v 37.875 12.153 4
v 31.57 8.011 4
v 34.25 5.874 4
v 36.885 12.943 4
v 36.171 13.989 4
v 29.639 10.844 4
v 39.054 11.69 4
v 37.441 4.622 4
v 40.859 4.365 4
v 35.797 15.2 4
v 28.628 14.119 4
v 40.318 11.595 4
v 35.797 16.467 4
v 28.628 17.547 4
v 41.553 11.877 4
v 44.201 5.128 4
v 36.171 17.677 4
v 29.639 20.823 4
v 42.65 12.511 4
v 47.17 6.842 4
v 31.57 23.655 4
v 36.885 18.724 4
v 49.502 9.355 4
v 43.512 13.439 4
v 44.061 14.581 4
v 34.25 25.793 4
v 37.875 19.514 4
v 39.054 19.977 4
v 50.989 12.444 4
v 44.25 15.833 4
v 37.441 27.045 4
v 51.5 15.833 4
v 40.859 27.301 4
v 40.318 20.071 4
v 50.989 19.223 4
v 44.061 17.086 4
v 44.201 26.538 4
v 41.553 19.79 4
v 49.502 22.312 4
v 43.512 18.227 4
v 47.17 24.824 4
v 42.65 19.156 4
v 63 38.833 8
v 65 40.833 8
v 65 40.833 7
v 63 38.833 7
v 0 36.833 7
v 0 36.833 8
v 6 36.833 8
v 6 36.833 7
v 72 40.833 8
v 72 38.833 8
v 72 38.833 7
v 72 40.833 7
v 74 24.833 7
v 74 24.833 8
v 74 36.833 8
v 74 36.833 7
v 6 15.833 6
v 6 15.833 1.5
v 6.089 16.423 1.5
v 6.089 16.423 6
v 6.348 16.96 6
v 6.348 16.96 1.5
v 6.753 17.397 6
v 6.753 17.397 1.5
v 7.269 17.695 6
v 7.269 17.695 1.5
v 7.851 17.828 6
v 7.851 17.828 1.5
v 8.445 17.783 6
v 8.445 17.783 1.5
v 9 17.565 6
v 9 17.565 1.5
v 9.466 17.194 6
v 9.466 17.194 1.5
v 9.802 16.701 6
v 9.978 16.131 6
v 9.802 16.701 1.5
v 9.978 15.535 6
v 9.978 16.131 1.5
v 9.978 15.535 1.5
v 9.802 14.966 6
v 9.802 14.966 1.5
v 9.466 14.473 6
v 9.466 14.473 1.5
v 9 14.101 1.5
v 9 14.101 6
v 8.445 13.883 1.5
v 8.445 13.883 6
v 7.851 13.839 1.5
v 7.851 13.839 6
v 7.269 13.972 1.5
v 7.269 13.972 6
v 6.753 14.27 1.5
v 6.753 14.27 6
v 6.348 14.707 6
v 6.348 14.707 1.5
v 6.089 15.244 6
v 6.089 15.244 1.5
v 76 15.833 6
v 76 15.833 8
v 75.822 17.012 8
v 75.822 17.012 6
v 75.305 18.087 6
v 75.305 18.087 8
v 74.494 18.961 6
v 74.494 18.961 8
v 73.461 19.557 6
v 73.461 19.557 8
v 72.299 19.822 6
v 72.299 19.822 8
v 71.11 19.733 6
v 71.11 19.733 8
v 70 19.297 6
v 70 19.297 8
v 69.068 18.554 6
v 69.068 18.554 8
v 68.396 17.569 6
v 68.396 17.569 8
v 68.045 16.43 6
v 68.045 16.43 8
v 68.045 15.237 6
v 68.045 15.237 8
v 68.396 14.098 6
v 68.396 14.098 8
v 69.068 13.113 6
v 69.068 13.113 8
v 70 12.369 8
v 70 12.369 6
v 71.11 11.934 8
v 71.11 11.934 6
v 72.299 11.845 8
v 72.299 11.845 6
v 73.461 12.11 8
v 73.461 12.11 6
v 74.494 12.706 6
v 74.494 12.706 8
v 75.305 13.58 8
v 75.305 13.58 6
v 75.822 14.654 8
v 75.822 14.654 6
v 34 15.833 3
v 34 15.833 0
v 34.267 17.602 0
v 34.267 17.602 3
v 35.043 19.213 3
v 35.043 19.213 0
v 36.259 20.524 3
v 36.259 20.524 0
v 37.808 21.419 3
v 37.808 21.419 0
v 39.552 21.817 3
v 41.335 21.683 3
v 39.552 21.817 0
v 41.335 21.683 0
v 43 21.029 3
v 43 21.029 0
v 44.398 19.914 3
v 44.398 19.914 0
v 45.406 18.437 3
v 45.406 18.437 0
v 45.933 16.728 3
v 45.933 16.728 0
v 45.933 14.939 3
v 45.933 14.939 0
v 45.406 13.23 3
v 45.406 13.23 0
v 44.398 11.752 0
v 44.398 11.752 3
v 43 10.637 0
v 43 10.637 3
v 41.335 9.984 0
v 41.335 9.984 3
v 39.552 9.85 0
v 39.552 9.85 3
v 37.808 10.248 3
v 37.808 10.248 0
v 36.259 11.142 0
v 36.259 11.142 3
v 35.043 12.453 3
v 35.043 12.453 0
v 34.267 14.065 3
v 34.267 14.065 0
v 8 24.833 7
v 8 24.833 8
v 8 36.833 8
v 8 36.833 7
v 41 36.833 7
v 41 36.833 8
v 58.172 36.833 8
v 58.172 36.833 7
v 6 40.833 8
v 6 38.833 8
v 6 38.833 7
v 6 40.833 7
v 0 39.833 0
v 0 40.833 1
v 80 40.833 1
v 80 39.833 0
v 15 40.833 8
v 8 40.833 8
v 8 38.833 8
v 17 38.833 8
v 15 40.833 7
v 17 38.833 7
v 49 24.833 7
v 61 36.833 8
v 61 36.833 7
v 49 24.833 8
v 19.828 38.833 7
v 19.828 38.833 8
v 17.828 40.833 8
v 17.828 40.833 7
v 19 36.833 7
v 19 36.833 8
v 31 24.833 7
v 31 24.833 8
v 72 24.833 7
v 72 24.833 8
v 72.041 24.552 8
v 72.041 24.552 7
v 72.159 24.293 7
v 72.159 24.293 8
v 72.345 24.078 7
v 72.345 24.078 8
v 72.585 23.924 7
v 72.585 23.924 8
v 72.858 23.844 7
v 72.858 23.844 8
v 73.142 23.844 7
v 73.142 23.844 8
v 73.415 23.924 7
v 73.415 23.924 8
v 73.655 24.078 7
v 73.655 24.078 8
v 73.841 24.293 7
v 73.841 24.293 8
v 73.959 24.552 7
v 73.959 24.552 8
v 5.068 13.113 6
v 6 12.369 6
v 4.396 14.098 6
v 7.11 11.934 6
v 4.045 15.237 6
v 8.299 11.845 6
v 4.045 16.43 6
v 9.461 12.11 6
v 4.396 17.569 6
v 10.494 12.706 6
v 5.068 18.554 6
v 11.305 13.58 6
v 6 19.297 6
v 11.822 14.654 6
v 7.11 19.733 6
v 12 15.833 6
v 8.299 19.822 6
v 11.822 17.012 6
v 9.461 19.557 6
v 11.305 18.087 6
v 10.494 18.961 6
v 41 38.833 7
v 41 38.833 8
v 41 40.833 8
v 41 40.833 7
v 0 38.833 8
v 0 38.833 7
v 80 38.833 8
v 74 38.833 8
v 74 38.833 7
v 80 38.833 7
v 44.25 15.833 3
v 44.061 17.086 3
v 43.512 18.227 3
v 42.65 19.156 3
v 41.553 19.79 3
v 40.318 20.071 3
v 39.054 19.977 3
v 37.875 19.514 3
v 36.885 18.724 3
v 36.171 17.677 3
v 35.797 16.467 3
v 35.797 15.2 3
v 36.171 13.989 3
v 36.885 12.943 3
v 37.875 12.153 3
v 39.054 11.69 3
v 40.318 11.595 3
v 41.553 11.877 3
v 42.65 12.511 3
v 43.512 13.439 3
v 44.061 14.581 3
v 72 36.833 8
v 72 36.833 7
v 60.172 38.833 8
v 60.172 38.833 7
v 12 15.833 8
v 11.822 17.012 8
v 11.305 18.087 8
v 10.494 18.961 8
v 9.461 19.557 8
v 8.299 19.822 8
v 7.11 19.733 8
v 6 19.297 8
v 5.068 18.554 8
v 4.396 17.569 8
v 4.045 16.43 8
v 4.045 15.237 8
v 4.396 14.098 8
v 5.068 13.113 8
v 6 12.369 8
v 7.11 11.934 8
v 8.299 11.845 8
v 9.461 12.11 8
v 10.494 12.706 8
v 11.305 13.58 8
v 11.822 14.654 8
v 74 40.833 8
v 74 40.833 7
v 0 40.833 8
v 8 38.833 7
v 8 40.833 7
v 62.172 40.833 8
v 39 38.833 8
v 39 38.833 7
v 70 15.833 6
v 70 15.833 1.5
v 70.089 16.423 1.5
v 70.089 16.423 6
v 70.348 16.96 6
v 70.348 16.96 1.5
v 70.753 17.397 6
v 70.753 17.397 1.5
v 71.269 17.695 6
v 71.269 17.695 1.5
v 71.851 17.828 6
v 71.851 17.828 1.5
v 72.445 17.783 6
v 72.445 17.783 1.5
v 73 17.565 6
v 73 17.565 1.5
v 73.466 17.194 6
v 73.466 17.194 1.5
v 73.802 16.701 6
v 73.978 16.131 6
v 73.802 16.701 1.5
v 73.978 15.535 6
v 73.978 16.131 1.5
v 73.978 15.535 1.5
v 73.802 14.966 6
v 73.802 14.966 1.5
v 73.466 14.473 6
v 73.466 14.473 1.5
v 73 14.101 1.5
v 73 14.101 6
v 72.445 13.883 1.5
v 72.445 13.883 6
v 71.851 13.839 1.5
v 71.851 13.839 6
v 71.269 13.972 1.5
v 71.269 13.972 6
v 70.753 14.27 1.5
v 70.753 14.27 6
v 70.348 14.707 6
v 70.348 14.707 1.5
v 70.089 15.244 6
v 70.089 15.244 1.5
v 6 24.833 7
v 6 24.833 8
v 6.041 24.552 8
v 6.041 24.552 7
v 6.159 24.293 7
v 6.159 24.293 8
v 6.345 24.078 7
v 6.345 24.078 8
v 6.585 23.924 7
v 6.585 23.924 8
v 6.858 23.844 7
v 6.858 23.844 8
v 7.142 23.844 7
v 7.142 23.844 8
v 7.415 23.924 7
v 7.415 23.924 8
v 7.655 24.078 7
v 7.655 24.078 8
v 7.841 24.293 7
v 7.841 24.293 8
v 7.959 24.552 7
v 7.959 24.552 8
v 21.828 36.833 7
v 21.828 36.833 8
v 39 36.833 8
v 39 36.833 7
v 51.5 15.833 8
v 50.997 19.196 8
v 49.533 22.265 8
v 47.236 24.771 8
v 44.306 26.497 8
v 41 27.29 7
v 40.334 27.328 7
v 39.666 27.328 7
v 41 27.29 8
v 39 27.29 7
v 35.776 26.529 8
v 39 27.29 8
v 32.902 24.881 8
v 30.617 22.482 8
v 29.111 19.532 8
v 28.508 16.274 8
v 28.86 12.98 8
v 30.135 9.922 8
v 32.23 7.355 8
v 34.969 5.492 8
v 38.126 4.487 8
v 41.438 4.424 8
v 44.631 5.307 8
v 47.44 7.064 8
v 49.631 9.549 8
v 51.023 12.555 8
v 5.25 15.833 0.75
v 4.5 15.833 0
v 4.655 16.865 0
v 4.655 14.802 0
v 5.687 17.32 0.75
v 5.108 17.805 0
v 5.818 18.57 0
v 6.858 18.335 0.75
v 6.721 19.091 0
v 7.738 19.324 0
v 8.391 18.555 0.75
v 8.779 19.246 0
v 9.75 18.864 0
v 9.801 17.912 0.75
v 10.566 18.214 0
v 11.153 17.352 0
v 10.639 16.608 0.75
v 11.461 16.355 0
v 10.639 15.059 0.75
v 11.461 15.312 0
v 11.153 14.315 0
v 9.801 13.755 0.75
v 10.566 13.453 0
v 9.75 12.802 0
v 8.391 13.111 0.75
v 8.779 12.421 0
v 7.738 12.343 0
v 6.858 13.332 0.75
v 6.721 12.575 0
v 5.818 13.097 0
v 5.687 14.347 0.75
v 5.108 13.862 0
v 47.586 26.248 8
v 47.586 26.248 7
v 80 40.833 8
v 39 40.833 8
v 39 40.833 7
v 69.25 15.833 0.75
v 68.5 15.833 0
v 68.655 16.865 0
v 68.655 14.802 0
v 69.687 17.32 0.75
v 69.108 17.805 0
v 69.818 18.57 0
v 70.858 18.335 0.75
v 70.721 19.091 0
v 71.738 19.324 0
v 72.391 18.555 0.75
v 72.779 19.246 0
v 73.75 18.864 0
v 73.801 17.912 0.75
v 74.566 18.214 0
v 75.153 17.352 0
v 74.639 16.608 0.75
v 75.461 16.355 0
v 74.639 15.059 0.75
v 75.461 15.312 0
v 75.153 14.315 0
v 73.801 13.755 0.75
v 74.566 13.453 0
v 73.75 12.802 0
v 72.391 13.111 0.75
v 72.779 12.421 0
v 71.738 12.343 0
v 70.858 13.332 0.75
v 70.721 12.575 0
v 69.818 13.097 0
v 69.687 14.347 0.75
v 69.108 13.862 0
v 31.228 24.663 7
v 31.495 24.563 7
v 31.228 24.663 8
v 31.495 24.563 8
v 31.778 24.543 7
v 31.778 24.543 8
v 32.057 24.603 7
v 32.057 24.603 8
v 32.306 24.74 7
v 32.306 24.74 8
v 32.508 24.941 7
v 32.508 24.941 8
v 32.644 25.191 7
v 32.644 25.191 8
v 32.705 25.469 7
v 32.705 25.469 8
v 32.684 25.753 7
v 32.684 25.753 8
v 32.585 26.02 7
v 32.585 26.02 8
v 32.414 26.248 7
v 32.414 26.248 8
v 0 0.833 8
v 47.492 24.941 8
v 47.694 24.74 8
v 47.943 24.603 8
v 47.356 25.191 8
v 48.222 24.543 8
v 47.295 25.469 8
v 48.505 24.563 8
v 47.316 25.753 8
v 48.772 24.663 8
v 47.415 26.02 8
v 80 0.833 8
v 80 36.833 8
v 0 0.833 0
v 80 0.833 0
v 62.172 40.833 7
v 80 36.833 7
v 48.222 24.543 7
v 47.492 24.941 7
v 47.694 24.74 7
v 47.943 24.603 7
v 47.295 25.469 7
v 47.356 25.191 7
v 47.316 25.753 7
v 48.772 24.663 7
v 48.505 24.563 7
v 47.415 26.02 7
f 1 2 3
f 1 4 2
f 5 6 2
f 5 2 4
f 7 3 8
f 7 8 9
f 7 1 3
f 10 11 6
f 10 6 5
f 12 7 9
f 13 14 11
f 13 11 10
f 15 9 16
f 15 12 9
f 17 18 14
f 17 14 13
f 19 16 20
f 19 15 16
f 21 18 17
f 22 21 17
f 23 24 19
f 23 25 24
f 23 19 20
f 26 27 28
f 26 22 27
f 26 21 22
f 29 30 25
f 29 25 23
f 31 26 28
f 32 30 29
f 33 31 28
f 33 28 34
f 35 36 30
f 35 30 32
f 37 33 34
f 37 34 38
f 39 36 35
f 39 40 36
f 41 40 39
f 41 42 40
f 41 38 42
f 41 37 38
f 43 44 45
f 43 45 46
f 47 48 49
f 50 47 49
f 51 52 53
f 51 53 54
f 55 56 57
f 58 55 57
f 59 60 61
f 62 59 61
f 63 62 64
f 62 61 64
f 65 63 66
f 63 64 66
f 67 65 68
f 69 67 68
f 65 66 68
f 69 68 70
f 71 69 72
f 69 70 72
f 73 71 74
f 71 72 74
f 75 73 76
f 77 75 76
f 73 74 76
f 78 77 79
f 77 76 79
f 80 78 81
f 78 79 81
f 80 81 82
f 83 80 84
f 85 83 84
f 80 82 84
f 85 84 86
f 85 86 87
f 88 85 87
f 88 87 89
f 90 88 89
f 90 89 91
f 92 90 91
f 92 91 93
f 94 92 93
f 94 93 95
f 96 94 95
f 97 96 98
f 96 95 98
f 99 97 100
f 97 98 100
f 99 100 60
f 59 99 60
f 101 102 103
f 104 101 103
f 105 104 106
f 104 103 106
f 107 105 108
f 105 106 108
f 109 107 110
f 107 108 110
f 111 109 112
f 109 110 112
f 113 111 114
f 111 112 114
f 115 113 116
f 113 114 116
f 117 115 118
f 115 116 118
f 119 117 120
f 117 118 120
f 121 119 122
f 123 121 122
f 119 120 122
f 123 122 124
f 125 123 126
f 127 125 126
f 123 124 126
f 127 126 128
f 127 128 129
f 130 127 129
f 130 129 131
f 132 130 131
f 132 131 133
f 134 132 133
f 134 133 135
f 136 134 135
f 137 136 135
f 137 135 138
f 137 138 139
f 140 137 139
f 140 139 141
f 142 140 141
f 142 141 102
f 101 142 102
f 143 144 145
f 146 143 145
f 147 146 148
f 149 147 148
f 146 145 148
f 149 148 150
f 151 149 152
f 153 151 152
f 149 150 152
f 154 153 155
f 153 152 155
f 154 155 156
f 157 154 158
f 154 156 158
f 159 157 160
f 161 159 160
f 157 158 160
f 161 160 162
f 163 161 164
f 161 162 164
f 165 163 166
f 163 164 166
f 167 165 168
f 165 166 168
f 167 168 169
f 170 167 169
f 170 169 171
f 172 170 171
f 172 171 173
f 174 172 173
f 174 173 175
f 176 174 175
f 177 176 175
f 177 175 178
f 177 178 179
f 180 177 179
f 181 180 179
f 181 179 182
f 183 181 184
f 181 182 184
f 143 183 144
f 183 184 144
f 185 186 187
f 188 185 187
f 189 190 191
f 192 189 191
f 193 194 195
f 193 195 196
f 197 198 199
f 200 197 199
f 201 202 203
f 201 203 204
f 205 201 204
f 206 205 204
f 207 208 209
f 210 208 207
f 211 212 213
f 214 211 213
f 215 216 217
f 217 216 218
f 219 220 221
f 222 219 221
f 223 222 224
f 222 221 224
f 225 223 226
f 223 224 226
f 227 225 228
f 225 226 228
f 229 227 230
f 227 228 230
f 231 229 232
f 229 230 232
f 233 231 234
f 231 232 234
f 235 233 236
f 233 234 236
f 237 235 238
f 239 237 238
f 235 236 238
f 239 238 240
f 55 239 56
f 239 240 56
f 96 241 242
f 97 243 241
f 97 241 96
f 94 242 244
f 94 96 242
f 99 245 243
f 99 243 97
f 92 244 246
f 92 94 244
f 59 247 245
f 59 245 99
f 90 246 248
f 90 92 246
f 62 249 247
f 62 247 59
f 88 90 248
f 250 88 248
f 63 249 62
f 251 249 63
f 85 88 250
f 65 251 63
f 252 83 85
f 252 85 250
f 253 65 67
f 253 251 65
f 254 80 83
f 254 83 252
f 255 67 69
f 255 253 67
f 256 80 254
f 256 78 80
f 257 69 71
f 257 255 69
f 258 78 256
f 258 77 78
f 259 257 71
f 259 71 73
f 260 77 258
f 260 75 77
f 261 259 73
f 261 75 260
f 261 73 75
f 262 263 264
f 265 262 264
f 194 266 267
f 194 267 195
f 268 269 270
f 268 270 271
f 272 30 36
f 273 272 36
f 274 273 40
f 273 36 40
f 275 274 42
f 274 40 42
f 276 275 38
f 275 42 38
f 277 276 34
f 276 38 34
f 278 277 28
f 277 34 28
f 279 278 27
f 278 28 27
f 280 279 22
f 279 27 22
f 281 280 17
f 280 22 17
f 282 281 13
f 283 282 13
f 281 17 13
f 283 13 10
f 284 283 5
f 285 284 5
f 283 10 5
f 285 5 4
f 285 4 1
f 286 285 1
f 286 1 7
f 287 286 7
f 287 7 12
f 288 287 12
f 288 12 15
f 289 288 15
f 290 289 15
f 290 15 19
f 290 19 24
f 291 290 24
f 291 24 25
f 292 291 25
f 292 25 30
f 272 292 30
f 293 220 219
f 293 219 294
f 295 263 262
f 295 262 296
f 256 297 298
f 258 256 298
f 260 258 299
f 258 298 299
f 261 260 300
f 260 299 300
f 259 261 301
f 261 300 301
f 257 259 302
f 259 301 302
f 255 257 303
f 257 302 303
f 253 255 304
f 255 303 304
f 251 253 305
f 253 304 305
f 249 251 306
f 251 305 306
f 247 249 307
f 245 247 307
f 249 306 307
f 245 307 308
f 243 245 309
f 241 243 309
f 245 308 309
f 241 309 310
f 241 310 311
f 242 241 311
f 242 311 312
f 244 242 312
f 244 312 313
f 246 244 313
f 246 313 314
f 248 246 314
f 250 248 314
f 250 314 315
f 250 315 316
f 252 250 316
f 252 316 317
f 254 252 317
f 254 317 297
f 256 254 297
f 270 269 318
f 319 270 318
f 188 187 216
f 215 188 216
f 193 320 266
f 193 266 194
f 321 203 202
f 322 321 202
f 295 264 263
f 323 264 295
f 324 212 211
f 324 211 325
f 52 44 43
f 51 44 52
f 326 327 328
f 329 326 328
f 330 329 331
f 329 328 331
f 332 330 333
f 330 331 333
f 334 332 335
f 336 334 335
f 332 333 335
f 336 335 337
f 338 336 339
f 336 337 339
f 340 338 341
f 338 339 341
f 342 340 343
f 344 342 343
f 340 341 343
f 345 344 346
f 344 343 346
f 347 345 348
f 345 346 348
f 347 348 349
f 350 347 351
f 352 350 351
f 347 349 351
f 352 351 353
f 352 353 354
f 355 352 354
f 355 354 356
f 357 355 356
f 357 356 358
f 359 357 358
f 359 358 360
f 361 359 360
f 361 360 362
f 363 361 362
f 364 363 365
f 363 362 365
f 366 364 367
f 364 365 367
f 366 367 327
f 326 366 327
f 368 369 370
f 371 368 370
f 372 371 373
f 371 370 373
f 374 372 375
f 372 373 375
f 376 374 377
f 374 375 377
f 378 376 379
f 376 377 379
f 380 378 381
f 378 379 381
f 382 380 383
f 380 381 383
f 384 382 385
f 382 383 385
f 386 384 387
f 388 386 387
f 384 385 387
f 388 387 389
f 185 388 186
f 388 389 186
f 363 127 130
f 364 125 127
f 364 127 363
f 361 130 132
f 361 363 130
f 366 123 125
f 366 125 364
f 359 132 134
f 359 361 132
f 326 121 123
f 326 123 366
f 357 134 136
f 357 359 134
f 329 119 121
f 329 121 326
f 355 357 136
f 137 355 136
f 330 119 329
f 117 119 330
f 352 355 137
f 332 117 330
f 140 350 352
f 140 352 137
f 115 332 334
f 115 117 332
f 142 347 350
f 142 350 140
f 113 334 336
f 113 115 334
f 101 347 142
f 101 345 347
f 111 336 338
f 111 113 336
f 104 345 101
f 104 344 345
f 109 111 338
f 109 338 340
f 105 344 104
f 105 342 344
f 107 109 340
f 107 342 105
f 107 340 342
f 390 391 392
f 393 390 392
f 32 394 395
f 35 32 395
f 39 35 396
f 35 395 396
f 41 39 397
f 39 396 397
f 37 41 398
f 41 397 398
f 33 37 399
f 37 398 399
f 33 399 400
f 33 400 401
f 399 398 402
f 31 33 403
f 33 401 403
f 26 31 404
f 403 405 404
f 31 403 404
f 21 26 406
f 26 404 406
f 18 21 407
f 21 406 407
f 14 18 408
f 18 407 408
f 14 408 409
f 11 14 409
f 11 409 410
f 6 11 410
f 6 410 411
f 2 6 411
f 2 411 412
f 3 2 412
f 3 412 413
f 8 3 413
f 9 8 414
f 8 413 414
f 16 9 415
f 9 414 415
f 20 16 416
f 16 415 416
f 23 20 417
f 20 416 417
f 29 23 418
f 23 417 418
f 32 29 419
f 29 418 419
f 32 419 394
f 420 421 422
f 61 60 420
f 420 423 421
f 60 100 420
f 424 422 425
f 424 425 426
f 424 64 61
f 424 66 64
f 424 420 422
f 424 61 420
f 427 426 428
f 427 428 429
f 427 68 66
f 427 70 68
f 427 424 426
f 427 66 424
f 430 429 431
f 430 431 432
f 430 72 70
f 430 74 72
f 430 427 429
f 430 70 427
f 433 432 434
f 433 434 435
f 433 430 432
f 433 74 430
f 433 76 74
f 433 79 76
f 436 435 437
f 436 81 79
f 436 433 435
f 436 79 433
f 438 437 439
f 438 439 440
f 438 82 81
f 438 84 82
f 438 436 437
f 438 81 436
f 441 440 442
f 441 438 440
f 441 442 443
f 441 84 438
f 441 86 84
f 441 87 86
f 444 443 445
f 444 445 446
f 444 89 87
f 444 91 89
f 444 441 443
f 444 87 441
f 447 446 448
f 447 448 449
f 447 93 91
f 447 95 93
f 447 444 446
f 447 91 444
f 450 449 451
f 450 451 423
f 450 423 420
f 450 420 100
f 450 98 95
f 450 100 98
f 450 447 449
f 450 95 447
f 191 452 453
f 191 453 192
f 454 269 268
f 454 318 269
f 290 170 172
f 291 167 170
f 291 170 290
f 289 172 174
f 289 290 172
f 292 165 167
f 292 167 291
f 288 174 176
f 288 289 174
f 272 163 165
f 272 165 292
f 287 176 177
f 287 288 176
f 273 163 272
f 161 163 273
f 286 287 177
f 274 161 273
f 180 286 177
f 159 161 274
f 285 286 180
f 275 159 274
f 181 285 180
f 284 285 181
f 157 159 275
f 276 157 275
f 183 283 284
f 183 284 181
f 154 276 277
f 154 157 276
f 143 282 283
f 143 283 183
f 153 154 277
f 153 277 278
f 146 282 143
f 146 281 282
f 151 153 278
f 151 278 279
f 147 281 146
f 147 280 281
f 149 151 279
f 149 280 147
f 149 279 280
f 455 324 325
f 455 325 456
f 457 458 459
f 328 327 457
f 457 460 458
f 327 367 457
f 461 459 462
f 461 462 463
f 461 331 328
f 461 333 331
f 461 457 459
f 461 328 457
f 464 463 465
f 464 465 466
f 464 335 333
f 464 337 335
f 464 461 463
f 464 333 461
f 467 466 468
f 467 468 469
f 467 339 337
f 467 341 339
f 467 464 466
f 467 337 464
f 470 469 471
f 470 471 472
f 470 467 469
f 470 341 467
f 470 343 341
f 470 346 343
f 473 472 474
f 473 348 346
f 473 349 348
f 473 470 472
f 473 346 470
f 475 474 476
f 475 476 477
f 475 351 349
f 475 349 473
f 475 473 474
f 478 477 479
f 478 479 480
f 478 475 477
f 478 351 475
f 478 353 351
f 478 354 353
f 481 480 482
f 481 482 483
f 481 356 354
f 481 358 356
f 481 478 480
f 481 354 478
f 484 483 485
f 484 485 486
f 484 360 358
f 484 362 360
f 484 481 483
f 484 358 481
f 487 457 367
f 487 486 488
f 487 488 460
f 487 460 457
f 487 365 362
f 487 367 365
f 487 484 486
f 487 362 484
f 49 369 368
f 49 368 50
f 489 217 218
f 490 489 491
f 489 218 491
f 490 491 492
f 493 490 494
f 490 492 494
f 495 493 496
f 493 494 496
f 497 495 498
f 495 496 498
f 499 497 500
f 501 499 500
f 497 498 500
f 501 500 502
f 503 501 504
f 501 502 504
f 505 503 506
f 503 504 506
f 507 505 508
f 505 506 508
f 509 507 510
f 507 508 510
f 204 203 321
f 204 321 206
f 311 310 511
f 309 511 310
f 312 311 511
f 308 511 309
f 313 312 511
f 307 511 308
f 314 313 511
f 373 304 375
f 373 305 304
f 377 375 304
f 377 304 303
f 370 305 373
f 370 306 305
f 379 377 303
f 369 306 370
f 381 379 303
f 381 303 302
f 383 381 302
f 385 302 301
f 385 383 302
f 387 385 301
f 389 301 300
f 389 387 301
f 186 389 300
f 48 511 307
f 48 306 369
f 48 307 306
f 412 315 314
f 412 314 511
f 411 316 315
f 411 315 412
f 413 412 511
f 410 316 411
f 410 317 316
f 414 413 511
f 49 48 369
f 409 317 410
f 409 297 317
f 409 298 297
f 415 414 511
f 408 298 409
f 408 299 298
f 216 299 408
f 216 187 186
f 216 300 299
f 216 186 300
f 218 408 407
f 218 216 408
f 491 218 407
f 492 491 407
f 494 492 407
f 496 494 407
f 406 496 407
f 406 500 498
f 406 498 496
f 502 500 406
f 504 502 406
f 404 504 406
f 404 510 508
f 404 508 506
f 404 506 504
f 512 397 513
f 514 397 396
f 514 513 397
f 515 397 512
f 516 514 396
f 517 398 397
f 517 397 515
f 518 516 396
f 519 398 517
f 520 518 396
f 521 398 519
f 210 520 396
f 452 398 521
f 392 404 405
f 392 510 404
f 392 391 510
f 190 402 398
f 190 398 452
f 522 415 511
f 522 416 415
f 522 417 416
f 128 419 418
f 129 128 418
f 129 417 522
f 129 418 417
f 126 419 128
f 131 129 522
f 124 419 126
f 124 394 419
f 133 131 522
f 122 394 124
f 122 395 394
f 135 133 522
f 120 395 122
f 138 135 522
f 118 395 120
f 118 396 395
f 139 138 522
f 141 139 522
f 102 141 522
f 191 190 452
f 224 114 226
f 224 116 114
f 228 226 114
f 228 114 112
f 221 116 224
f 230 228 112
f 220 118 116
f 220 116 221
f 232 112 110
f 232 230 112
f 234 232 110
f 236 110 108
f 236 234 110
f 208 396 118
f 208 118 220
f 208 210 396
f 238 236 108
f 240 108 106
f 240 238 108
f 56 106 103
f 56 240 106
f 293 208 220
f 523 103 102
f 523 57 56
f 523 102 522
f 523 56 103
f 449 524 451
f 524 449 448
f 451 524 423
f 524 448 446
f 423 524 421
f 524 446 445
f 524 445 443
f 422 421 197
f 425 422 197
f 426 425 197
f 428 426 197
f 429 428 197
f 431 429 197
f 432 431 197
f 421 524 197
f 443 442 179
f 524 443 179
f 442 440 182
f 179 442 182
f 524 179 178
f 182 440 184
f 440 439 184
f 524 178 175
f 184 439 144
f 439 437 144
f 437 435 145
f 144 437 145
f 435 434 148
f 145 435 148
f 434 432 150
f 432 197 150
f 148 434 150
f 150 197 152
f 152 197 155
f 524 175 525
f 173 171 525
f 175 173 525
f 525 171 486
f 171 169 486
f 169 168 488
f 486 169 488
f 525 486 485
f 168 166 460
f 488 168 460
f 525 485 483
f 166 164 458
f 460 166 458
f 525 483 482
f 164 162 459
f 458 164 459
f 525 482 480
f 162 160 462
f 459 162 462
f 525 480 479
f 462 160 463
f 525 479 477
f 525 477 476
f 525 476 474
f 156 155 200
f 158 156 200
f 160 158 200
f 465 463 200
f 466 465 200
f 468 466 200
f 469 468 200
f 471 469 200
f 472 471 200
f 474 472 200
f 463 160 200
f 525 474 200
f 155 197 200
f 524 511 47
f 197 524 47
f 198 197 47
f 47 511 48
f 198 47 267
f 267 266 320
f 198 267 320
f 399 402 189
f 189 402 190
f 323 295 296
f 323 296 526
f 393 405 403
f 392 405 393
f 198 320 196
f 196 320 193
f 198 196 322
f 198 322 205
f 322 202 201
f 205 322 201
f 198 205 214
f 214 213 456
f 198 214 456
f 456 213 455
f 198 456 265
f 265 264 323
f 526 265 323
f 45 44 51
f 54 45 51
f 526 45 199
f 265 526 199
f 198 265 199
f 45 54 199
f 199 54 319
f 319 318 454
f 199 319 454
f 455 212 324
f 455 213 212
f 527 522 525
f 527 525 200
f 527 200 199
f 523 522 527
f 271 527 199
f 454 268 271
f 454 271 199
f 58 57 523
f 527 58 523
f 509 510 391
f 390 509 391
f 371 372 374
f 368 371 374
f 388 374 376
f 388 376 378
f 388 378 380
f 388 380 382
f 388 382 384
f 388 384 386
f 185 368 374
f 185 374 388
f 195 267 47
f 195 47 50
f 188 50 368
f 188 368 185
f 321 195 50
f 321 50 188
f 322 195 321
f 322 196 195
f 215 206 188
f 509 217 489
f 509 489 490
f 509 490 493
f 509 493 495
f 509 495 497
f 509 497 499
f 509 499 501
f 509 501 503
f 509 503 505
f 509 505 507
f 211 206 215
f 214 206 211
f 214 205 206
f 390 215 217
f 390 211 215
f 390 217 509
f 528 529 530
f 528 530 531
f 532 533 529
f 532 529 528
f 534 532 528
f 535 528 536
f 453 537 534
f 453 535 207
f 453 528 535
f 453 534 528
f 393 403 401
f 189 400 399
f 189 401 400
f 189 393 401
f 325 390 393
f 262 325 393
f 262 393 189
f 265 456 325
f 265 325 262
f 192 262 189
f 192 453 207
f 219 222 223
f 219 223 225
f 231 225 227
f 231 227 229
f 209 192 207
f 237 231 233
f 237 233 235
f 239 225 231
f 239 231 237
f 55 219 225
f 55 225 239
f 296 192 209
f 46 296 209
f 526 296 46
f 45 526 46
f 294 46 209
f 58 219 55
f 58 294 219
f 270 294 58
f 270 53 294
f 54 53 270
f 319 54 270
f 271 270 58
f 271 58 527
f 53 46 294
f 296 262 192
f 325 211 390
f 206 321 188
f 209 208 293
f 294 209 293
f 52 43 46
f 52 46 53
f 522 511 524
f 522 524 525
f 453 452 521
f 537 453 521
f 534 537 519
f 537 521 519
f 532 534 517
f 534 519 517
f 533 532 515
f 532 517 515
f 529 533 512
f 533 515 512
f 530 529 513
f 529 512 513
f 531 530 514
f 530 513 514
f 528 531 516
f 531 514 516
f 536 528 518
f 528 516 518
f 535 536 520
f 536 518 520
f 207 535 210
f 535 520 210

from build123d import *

# Parameters (mm, degrees)
SKETCH_1_W                     = 80
SKETCH_1_H                     = 60
EXTRUDE_1_DEPTH                = 8
HOLE_WIZARD_M3_5_1_D           = 4
HOLE_WIZARD_M3_5_1_CBORE_D     = 8
HOLE_WIZARD_M3_5_1_CBORE_DEPTH = 2
SKETCH_14_W                    = 80
SKETCH_14_H                    = 2
SKETCH_14_W_2                  = 2
SKETCH_14_H_2                  = 16
CUT_EXTRUDE_1_DEPTH            = 1
CUT_EXTRUDE_2_REACH            = 92.174
SKETCH_15_R                    = 4.25
SKETCH_17_R                    = 11.5
CUT_EXTRUDE_4_DEPTH            = 4
SKETCH_18_R                    = 6
CUT_EXTRUDE_5_DEPTH            = 3
CHAMFER_1_SIZE                 = 1.499999999
CHAMFER_1_SIZE2                = 1.500000001
CHAMFER_2_SIZE                 = 1
SKETCH_20_W                    = 80
SKETCH_20_H                    = 6
CUT_EXTRUDE_6_DEPTH            = 1
SKETCH_21_W                    = 80
SKETCH_21_H                    = 4
CUT_EXTRUDE_7_DEPTH            = 1
SKETCH_22_W                    = 80
SKETCH_22_H                    = 2
CUT_EXTRUDE_8_DEPTH            = 1
SKETCH_23_R                    = 1
CUT_EXTRUDE_9_DEPTH            = 1
CUT_EXTRUDE_10_REACH           = 92.174
SKETCH_24_W                    = 80
SKETCH_24_H                    = 20


with BuildPart() as part:
    # 草图1 → 凸台-拉伸1 (new body)
    with BuildSketch(Plane.XY.offset(8)):
        with Locations((40, 10.833333333)):
            Rectangle(SKETCH_1_W, SKETCH_1_H)
    extrude(amount=-EXTRUDE_1_DEPTH)

    # M3.5 六角头机械螺钉的柱形沉头孔1 (through all)
    with Locations(Plane.XY.offset(8)):
        with Locations((8, 15.833333333), (72, 15.833333333)):
            CounterBoreHole(HOLE_WIZARD_M3_5_1_D / 2, HOLE_WIZARD_M3_5_1_CBORE_D / 2, HOLE_WIZARD_M3_5_1_CBORE_DEPTH)

    # 草图14 → 切除-拉伸1 (cut)
    with BuildSketch(Plane.XY.offset(8)):
        with Locations((40, 37.833333333)):
            Rectangle(SKETCH_14_W, SKETCH_14_H)
        Polygon((15, 40.833333333), (31, 24.833333333), (32.414213562, 26.247546896), (16.414213562, 42.247546896), align=None)
        with Locations((7, 32.833333333)):
            Rectangle(SKETCH_14_W_2, SKETCH_14_H_2)
        with Locations((40, 32.833333333)):
            Rectangle(SKETCH_14_W_2, SKETCH_14_H_2)
        with Locations((73, 32.833333333)):
            Rectangle(SKETCH_14_W_2, SKETCH_14_H_2)
        Polygon((47.585786438, 26.247546896), (63.585786438, 42.247546896), (65, 40.833333333), (49, 24.833333333), align=None)
    extrude(amount=-CUT_EXTRUDE_1_DEPTH, mode=Mode.SUBTRACT)

    # 草图15 → 切除-拉伸2 (cut, up to next)
    with BuildSketch(Plane.XY.offset(8), mode=Mode.PRIVATE) as cut_extrude_2_sk1:
        with Locations((40, 15.833333333)):
            Circle(SKETCH_15_R)
    cut_extrude_2_tool1 = extrude(cut_extrude_2_sk1.sketch, amount=-CUT_EXTRUDE_2_REACH, mode=Mode.PRIVATE) & part.part
    add(cut_extrude_2_tool1.solids().sort_by_distance((40, 15.833333, 8))[0], mode=Mode.SUBTRACT)

    # 草图17 → 切除-拉伸4 (cut)
    with BuildSketch(Plane.XY.offset(8)):
        with Locations((40, 15.833333333)):
            Circle(SKETCH_17_R)
    extrude(amount=-CUT_EXTRUDE_4_DEPTH, mode=Mode.SUBTRACT)

    # 草图18 → 切除-拉伸5 (cut)
    with BuildSketch(Plane(origin=(0, 0, 0), x_dir=(-1, 0, 0), z_dir=(0, 0, -1))):
        with Locations((-40, 15.833333333)):
            Circle(SKETCH_18_R)
    extrude(amount=-CUT_EXTRUDE_5_DEPTH, mode=Mode.SUBTRACT)

    # 倒角1
    chamfer_1_edges = [part.edges().sort_by_distance(p)[0] for p in [
        (74, 15.833333333, 0),
        (10, 15.833333333, 0),
    ]]
    chamfer_1_side = [part.faces().sort_by_distance(p)[0] for p in [
        (79, 10.833333333, 0),
    ]]
    chamfer(chamfer_1_edges, length=CHAMFER_1_SIZE, length2=CHAMFER_1_SIZE2, reference=chamfer_1_side[0])

    # 倒角2
    chamfer_2_edges = [part.edges().sort_by_distance(p)[0] for p in [
        (40, 40.833333333, 0),
    ]]
    chamfer(chamfer_2_edges, length=CHAMFER_2_SIZE)

    # 草图20 → 切除-拉伸6 (cut)
    with BuildSketch(Plane.XY.offset(8)):
        with Locations((40, -16.166666667)):
            Rectangle(SKETCH_20_W, SKETCH_20_H)
    extrude(amount=-CUT_EXTRUDE_6_DEPTH, mode=Mode.SUBTRACT)

    # 草图21 → 切除-拉伸7 (cut)
    with BuildSketch(Plane.XY.offset(7)):
        with Locations((40, -17.166666667)):
            Rectangle(SKETCH_21_W, SKETCH_21_H)
    extrude(amount=-CUT_EXTRUDE_7_DEPTH, mode=Mode.SUBTRACT)

    # 草图22 → 切除-拉伸8 (cut)
    with BuildSketch(Plane.XY.offset(6)):
        with Locations((40, -18.166666667)):
            Rectangle(SKETCH_22_W, SKETCH_22_H)
    extrude(amount=-CUT_EXTRUDE_8_DEPTH, mode=Mode.SUBTRACT)

    # 草图23 → 切除-拉伸9 (cut)
    with BuildSketch(Plane.XY.offset(8)):
        with Locations((7, 24.833333333)):
            Circle(SKETCH_23_R)
        with Locations((31.707106781, 25.540440115)):
            Circle(SKETCH_23_R)
        with Locations((48.292893219, 25.540440115)):
            Circle(SKETCH_23_R)
        with Locations((73, 24.833333333)):
            Circle(SKETCH_23_R)
    extrude(amount=-CUT_EXTRUDE_9_DEPTH, mode=Mode.SUBTRACT)

    # 草图24 → 切除-拉伸10 (cut, up to next)
    with BuildSketch(Plane.XY.offset(8), mode=Mode.PRIVATE) as cut_extrude_10_sk1:
        with Locations((40, -9.166666667)):
            Rectangle(SKETCH_24_W, SKETCH_24_H)
    cut_extrude_10_tool1 = extrude(cut_extrude_10_sk1.sketch, amount=-CUT_EXTRUDE_10_REACH, mode=Mode.PRIVATE) & part.part
    add(cut_extrude_10_tool1.solids().sort_by_distance((40, -9.166667, 8))[0], mode=Mode.SUBTRACT)


solid = part.part
